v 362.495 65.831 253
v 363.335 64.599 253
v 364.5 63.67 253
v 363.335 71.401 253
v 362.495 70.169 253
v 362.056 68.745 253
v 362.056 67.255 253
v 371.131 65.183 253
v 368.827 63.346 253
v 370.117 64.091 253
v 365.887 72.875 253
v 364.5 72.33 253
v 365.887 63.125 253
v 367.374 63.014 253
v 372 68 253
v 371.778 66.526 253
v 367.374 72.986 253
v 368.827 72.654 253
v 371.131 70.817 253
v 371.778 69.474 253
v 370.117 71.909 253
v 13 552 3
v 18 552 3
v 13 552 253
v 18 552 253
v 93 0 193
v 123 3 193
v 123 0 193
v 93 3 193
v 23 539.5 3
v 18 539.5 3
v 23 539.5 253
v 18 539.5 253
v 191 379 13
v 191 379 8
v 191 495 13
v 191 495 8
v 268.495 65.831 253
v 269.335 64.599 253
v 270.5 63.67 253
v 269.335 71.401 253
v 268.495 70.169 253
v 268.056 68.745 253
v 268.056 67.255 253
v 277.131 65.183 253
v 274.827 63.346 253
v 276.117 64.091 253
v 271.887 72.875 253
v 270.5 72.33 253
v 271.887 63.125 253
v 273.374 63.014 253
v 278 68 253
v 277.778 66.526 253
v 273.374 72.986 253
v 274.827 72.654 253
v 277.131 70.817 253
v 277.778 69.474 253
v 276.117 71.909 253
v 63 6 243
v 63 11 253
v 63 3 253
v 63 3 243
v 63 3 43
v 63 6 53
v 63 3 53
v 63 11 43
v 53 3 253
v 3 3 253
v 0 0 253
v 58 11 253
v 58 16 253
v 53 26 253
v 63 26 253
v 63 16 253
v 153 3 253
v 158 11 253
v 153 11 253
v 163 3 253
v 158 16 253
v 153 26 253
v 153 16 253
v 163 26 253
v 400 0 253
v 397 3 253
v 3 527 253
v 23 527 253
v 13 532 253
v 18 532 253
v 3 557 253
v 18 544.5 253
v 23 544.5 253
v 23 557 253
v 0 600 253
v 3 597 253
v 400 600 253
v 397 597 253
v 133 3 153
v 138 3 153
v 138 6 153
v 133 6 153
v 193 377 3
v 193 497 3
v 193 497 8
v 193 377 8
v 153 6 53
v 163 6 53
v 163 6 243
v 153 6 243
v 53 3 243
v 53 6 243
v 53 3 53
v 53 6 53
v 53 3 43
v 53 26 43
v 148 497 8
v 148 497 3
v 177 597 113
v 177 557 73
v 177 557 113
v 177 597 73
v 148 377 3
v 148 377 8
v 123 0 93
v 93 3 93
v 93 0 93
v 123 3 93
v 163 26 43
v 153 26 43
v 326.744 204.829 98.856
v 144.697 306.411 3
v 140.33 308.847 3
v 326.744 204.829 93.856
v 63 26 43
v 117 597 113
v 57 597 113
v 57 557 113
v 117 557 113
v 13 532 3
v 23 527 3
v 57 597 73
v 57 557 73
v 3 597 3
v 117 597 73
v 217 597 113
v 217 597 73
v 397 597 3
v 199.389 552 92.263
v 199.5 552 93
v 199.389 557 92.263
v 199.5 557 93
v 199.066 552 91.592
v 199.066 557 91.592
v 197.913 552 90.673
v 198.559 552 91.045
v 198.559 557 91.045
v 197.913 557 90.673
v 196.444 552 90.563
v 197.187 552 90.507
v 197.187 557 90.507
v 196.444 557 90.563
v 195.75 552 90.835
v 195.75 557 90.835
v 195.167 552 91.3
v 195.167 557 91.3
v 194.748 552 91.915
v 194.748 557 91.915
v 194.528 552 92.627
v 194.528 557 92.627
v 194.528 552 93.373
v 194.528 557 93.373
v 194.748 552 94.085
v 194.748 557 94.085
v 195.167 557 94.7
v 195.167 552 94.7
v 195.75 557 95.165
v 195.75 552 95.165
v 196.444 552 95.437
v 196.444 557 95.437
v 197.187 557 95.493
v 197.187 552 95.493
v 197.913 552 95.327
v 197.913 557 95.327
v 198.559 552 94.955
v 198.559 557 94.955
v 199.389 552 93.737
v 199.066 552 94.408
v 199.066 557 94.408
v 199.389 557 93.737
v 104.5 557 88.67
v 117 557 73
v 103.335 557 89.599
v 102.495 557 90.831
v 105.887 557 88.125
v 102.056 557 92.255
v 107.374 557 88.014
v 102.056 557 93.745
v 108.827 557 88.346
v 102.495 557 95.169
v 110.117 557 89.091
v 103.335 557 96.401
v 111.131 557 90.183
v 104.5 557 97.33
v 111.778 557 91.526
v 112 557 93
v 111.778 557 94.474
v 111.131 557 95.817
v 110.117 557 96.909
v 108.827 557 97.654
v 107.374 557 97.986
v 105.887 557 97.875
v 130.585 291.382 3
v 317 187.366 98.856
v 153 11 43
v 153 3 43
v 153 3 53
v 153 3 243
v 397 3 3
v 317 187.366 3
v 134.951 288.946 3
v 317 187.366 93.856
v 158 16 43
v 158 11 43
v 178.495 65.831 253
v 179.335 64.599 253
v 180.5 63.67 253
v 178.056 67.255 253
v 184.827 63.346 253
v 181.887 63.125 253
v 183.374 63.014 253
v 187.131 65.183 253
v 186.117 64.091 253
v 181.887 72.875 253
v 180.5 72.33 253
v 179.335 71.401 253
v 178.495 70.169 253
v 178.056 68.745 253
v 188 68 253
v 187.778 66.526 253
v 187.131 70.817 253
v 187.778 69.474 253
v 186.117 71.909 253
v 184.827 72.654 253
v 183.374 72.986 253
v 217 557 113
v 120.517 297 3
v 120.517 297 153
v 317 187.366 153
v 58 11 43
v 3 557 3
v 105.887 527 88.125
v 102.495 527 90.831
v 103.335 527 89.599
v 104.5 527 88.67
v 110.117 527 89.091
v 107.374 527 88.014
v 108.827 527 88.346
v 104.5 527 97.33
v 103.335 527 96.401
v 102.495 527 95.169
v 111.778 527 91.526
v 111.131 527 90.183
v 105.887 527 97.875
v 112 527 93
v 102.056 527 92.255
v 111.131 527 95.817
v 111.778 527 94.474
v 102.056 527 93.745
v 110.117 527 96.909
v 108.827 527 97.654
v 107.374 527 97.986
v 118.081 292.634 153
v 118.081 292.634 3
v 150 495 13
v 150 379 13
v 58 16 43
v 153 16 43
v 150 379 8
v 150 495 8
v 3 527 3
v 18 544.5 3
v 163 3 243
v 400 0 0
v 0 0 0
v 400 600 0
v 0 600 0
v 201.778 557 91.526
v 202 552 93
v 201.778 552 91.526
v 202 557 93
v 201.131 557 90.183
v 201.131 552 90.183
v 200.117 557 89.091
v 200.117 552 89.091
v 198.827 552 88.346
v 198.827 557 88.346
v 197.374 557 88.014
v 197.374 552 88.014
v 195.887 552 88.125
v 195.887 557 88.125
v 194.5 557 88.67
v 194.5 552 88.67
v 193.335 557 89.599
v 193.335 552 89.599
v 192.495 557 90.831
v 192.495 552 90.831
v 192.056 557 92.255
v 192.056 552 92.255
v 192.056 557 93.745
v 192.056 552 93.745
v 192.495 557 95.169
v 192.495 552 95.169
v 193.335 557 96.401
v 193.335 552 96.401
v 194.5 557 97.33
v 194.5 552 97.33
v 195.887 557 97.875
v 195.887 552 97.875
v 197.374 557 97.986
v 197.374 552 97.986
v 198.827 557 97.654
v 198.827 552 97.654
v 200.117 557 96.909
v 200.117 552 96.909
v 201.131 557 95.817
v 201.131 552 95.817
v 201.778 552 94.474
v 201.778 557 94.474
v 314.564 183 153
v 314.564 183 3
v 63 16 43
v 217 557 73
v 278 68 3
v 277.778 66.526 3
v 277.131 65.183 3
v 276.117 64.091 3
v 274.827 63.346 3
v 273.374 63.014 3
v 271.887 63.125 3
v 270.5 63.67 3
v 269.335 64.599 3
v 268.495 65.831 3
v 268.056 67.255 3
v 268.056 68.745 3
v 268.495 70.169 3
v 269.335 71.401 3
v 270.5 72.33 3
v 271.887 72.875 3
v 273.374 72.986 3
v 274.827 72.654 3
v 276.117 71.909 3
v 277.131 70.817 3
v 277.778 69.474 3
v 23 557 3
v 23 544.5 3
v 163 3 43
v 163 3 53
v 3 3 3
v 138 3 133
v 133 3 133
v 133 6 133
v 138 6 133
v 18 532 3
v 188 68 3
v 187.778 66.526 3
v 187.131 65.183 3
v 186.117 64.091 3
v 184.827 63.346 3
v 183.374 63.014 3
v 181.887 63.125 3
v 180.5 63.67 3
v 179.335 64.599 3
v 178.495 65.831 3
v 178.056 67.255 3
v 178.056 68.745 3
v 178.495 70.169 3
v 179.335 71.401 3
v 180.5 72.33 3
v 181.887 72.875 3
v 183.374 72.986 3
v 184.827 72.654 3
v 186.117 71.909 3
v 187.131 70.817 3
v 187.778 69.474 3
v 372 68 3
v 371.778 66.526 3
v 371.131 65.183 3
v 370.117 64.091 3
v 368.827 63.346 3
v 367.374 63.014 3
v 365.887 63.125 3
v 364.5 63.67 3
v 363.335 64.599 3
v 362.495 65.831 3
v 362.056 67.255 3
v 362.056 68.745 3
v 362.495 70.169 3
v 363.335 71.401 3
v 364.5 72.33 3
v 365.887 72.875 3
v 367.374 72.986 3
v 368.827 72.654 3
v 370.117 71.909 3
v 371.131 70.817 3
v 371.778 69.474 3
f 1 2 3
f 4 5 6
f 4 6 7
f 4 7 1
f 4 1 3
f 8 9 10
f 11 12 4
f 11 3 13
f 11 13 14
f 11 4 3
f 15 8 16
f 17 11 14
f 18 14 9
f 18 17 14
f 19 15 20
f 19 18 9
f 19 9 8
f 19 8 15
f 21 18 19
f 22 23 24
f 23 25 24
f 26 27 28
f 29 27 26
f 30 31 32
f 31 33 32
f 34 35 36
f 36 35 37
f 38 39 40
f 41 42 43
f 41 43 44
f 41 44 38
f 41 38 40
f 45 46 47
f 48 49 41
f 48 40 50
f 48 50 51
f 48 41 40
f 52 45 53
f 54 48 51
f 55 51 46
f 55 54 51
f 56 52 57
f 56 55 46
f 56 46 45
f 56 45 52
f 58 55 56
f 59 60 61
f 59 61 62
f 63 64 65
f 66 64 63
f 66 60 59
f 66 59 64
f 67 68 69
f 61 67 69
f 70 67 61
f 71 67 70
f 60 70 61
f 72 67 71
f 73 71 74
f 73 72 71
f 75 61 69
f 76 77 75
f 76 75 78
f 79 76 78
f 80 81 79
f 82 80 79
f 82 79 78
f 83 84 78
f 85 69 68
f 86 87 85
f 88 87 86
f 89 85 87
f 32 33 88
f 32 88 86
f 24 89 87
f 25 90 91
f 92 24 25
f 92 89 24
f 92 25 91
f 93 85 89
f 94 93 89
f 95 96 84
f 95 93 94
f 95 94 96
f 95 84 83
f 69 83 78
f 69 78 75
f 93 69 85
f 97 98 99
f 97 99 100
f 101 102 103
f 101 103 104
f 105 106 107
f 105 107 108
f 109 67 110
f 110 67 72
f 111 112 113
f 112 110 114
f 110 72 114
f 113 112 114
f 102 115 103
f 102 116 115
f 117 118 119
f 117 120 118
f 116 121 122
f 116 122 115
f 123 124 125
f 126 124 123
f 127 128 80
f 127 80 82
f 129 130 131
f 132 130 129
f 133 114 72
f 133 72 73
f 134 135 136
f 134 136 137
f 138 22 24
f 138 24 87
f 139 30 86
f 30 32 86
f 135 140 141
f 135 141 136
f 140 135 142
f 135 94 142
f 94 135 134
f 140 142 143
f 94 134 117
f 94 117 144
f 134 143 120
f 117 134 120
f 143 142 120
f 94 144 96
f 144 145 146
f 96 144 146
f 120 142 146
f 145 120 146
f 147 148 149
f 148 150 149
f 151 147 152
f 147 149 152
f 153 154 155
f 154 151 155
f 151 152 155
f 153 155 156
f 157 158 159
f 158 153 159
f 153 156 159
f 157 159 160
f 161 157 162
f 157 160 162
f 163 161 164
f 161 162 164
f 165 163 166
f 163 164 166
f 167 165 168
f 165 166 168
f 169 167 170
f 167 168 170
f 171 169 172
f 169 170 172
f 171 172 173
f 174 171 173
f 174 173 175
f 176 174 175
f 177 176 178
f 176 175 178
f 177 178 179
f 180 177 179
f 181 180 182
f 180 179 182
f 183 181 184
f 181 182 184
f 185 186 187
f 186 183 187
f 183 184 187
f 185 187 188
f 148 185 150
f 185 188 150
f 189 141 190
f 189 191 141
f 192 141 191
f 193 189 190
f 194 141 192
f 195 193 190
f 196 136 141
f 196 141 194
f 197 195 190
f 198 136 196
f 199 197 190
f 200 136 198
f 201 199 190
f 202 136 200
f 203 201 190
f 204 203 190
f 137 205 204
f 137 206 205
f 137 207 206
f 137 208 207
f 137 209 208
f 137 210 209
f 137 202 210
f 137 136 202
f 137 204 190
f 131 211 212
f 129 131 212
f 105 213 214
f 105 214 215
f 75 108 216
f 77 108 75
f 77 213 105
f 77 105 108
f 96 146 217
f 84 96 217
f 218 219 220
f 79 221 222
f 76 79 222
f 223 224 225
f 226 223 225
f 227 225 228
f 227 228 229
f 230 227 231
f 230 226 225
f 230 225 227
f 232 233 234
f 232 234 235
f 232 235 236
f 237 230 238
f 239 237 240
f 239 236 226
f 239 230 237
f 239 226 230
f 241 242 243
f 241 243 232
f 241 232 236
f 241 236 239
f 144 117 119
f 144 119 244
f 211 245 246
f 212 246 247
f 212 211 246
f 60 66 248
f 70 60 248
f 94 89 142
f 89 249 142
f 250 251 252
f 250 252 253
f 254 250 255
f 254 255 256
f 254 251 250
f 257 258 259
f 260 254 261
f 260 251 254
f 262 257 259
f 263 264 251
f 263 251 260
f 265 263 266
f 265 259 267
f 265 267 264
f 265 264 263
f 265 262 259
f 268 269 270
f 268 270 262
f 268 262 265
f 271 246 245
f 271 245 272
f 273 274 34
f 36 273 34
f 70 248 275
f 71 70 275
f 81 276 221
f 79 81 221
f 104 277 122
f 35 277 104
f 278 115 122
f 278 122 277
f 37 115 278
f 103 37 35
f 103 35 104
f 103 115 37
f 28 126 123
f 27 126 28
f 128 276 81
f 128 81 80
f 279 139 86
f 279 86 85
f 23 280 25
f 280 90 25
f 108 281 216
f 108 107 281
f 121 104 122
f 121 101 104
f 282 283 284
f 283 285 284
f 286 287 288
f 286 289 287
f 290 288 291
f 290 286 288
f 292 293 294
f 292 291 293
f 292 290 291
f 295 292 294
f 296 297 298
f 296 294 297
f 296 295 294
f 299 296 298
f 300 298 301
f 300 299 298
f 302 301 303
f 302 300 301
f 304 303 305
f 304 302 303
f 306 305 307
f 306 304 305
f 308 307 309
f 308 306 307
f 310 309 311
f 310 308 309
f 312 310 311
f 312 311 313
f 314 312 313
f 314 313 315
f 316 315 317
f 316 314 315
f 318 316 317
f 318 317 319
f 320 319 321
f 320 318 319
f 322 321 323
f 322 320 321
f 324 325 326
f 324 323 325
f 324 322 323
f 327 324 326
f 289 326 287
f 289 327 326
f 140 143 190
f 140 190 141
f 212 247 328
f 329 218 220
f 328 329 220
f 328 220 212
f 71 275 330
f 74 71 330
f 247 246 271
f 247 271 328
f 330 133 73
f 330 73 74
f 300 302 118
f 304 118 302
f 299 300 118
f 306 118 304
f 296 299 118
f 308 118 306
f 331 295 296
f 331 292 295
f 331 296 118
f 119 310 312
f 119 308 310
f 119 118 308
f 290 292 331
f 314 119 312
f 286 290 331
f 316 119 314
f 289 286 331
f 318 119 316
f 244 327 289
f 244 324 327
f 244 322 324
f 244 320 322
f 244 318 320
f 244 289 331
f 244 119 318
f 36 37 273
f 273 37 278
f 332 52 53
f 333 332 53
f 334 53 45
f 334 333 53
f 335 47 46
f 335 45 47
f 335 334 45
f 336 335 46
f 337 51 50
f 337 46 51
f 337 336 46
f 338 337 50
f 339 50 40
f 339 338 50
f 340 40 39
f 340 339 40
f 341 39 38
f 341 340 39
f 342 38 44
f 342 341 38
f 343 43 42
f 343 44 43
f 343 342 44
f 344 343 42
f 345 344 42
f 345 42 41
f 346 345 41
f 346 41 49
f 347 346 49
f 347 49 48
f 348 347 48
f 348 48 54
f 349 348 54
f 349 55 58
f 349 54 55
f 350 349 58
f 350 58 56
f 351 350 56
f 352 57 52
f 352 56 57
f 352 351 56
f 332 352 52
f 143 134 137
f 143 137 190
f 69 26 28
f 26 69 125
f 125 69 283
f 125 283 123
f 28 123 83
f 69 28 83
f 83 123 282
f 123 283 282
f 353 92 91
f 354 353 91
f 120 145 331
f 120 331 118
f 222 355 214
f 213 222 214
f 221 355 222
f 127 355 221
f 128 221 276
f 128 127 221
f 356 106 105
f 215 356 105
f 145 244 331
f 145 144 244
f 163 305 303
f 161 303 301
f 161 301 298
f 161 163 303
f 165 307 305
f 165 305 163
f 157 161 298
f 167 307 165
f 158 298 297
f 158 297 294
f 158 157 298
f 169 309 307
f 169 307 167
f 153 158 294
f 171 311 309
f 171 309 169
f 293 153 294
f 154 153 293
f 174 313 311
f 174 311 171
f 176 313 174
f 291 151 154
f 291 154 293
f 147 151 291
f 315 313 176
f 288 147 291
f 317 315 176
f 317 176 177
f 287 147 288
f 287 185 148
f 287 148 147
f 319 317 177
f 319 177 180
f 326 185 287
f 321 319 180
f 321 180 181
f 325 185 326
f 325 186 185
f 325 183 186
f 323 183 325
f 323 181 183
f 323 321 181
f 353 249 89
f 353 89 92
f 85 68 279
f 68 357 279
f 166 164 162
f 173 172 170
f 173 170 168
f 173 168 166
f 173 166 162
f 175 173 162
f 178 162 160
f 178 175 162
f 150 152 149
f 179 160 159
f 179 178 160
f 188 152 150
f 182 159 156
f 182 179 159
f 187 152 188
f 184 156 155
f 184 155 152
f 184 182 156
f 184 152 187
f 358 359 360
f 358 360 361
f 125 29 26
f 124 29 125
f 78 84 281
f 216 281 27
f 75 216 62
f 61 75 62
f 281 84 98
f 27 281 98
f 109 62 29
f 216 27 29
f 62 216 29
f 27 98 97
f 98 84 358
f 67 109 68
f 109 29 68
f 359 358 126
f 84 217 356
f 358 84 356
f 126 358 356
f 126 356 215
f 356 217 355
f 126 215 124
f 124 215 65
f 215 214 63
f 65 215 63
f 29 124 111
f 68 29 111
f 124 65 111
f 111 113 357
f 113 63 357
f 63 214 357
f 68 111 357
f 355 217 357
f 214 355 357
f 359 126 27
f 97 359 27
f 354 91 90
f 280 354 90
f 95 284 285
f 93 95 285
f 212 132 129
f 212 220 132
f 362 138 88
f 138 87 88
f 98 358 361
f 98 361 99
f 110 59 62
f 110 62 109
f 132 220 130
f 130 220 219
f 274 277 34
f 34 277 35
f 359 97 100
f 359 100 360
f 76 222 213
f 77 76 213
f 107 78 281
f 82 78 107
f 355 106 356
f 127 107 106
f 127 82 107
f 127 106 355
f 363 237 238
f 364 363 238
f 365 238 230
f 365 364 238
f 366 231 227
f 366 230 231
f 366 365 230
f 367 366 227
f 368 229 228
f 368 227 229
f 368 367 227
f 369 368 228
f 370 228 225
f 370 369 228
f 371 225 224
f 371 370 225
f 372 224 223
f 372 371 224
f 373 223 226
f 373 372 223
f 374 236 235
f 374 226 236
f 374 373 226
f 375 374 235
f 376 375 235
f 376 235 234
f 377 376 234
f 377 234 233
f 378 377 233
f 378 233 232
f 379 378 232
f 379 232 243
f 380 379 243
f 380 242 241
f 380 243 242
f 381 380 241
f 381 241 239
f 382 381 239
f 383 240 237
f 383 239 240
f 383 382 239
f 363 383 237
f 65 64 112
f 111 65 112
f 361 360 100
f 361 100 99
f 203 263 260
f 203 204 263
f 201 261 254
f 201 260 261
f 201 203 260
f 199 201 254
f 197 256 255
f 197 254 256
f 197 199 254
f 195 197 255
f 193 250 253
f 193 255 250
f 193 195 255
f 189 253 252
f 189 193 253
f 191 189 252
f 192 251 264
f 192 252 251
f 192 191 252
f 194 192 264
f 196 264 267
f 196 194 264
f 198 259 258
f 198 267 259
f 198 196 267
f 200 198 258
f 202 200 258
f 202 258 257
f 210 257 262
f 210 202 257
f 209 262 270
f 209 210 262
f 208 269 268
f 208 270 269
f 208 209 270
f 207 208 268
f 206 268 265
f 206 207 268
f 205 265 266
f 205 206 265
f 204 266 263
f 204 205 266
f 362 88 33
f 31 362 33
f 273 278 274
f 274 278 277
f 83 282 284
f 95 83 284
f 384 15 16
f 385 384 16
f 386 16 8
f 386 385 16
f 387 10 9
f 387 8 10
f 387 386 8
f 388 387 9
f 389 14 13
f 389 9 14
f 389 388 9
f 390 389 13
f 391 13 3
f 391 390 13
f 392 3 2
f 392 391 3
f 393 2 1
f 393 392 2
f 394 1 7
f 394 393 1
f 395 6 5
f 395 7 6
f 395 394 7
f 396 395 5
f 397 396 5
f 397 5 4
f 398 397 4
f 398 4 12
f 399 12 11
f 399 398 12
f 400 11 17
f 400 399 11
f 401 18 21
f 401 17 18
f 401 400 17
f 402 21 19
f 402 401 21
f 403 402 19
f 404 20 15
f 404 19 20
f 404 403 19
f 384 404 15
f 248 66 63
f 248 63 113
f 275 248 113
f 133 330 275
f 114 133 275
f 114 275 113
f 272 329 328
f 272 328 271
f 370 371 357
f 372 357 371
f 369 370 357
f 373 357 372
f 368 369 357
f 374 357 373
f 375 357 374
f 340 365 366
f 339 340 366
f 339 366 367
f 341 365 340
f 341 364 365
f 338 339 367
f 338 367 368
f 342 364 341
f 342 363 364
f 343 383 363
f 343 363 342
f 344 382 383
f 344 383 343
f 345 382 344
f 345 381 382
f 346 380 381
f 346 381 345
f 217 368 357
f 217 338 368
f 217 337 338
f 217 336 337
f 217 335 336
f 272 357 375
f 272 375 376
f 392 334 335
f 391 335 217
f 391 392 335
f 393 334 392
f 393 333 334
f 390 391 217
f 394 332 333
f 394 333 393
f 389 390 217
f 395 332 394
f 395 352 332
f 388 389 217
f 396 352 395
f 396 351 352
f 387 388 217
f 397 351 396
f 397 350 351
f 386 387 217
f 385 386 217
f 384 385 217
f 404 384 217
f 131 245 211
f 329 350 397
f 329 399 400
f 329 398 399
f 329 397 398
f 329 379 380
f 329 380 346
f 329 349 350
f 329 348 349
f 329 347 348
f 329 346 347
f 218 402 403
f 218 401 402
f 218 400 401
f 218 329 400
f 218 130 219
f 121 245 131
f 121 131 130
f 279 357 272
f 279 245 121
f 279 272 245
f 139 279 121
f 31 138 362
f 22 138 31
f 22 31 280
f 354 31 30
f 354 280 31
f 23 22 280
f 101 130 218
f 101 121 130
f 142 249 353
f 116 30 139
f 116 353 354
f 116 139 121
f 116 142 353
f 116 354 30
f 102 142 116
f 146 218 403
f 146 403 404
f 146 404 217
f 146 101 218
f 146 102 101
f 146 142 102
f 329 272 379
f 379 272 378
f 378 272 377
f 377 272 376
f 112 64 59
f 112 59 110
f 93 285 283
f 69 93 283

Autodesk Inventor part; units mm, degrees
ref_plane "YZ Plane" through (0, 0, 0) normal (1, 0, 0) x (0, 1, 0)
ref_plane "XZ Plane" through (0, 0, 0) normal (0, 1, 0) x (-1, 0, 0)
ref_plane "XY Plane" through (0, 0, 0) normal (0, 0, 1) x (1, 0, 0)
sketch "Sketch1" plane through (0, 0, 0) normal (0, 0, 1) x (1, 0, 0)
  line L0 (0, 0) -> (400, 0)
  line L1 (400, 0) -> (400, 600)
  line L2 (400, 600) -> (0, 600)
  line L3 (0, 600) -> (0, 0)
  dimension "d0" = 400
  dimension "d1" = 600
extrude "Extrusion1" add sketch "Sketch1" along normal blind 3
sketch "Sketch2" plane through (0, 0, 3) normal (0, 0, 1) x (1, 0, 0)
  line L0 (400, 600) -> (0, 600) projected
  line L1 (400, 0) -> (400, 600) projected
  line L2 (0, 600) -> (400, 600)
  line L3 (400, 600) -> (400, 0)
  line L4 (400, 0) -> (0, 0)
  line L5 (0, 0) -> (0, 600)
  line L6 (3, 597) -> (397, 597)
  line L7 (397, 597) -> (397, 3)
  line L8 (397, 3) -> (3, 3)
  line L9 (3, 3) -> (3, 597)
  dimension "d4" = 3
extrude "Extrusion2" add sketch "Sketch2" along normal blind 250
sketch "Sketch3" plane through (3, 597, 3) normal (0, -1, 0) x (1, 0, 0)
  line L0 (54, 110) -> (114, 110)
  line L1 (114, 110) -> (114, 70)
  line L2 (114, 70) -> (54, 70)
  line L3 (54, 70) -> (54, 110)
  line L4 (0, 250) -> (394, 250) projected
  line L5 (394, 0) -> (0, 0) projected
  point P0 (-3, -3)
  dimension "d7" = 40
  dimension "d8" = 60
  dimension "d9" = 54
  dimension "d11" = 70
extrude "Extrusion3" add sketch "Sketch3" along normal blind 40
sketch "Sketch4" plane through (3, 557, 3) normal (0, -1, 0) x (1, 0, 0)
  circle A0 centre (104, 90) radius 5
  line L0 (114, 70) -> (114, 110) projected
  line L1 (114, 110) -> (54, 110) projected
  point P0 (-3, -3)
  dimension "d14" = 10
  dimension "d15" = 10
  dimension "d16" = 20
extrude "Extrusion4" add sketch "Sketch4" along normal blind 30
sketch "Sketch5" plane through (0, 0, 253) normal (0, 0, 1) x (1, 0, 0)
  line L0 (3, 3) -> (3, 597) projected
  line L1 (3, 557) -> (23, 557)
  line L2 (23, 557) -> (23, 527)
  line L3 (23, 527) -> (3, 527)
  line L4 (3, 527) -> (3, 557)
  line L5 (23, 544.5) -> (18, 544.5)
  line L6 (18, 544.5) -> (18, 539.5)
  line L7 (18, 539.5) -> (23, 539.5)
  line L8 (23, 539.5) -> (23, 544.5)
  line L9 (23, 542) -> (-4.5465, 542) construction
  line L10 (18, 552) -> (13, 552)
  line L11 (13, 552) -> (13, 532)
  line L12 (13, 532) -> (18, 532)
  line L13 (18, 532) -> (18, 552)
  line L14 (3, 597) -> (397, 597) construction
  point P0 (0, 0)
  point P1 (18, 542)
  point P2 (18, 544.5)
  point P3 (3, 527)
  point P4 (23, 539.5)
  point P5 (18, 539.5)
  dimension "d19" = 20
  dimension "d20" = 30
  dimension "d21" = 5
  dimension "d22" = 5
  dimension "d24" = 2.5
  dimension "d25" = 5
  dimension "d26" = 20
  dimension "d28" = 10
  dimension "d29" = 40
extrude "Extrusion5" add sketch "Sketch5" against normal blind 250 contours L0 L1 L2 L5 L13 L10 L11 L12 L7 L3
sketch "Sketch6" plane through (0, 0, 3) normal (0, 0, 1) x (1, 0, 0)
  line L0 (148, 497) -> (193, 497)
  line L1 (193, 497) -> (193, 377)
  line L2 (193, 377) -> (148, 377)
  line L3 (148, 377) -> (148, 497)
  line L4 (3, 3) -> (3, 527) projected
  line L5 (3, 597) -> (397, 597) projected
  point P0 (0, 0)
  dimension "d32" = 45
  dimension "d33" = 120
  dimension "d34" = 145
  dimension "d35" = 100
extrude "Extrusion6" add sketch "Sketch6" along normal blind 5
sketch "Sketch7" plane through (0, 0, 8) normal (0, 0, 1) x (1, 0, 0)
  line L0 (148, 377) -> (193, 377) projected
  line L1 (148, 497) -> (193, 497)
  line L2 (193, 497) -> (193, 377)
  line L3 (193, 377) -> (148, 377)
  line L4 (148, 377) -> (148, 497)
  line L5 (191, 495) -> (150, 495)
  line L6 (150, 495) -> (150, 379)
  line L7 (150, 379) -> (191, 379)
  line L8 (191, 379) -> (191, 495)
  point P0 (0, 0)
  point P1 (148, 377)
  dimension "d40" = 2
extrude "Extrusion7" add sketch "Sketch7" along normal blind 5 contours L8 L7 L6 L5
sketch "Sketch8" plane through (0, 0, 253) normal (0, 0, 1) x (1, 0, 0)
  line L0 (3, 527) -> (3, 3) projected
  line L1 (53, 26) -> (63, 26)
  line L2 (63, 26) -> (63, 6)
  line L3 (63, 6) -> (53, 6)
  line L4 (53, 6) -> (53, 26)
  line L5 (397, 3) -> (3, 3) projected
  line L6 (153, 26) -> (163, 26)
  line L7 (163, 26) -> (163, 6)
  line L8 (163, 6) -> (153, 6)
  line L9 (153, 6) -> (153, 26)
  line L10 (58, 16) -> (63, 16)
  line L11 (63, 16) -> (63, 11)
  line L12 (63, 11) -> (58, 11)
  line L13 (58, 11) -> (58, 16)
  line L14 (153, 16) -> (158, 16)
  line L15 (158, 16) -> (158, 11)
  line L16 (158, 11) -> (153, 11)
  line L17 (153, 11) -> (153, 16)
  point P0 (0, 0)
  point P1 (53, 28)
  dimension "d54" = 10
  dimension "d55" = 20
  dimension "d57" = 50
  dimension "d60" = 3
  dimension "d61" = 10
  dimension "d62" = 20
  dimension "d65" = 3
  dimension "d74" = 5
  dimension "d75" = 5
  dimension "d76" = 90
  dimension "d77" = 5
  dimension "d79" = 5
  dimension "d80" = 5
  dimension "d81" = 5
extrude "Extrusion8" add sketch "Sketch8" against normal blind 210 contours L1 L2 L10 L13 L12 L3 L4 | L6 L7 L8 L9 L16 L15 L14
sketch "Sketch9" plane through (53, 6, 253) normal (0, -1, 0) x (1, 0, 0)
  line L0 (0, 0) -> (0, -210) projected
  line L1 (10, 0) -> (10, -210) projected
  line L2 (0, 0) -> (10, 0)
  line L3 (10, 0) -> (10, -10)
  line L4 (10, -10) -> (0, -10)
  line L5 (0, -10) -> (0, 0)
  line L6 (100, 0) -> (110, 0) projected
  line L7 (110, 0) -> (110, -210) projected
  line L8 (100, 0) -> (110, 0)
  line L9 (110, 0) -> (110, -10)
  line L10 (110, -10) -> (100, -10)
  line L11 (100, -10) -> (100, 0)
  line L12 (10, -210) -> (0, -210) projected
  line L13 (0, -210) -> (10, -210)
  line L14 (10, -210) -> (10, -200)
  line L15 (10, -200) -> (0, -200)
  line L16 (0, -200) -> (0, -210)
  line L17 (110, -210) -> (100, -210) projected
  line L18 (100, -210) -> (110, -210)
  line L19 (110, -210) -> (110, -200)
  line L20 (110, -200) -> (100, -200)
  line L21 (100, -200) -> (100, -210)
  point P0 (-53, -253)
  point P1 (10, -200)
  point P2 (0, -200)
  dimension "d67" = 10
  dimension "d68" = 10
  dimension "d69" = 10
  dimension "d70" = 10
  dimension "d73" = 10
extrude "Extrusion9" add sketch "Sketch9" along normal blind 3 contours L2 L1 L4 L0 | L15 L1 L12 L0 | L7 L17 L21 L20 | L6 L7 L10 L11
sketch "Sketch10" plane through (3, 3, 3) normal (0, 1, 0) x (1, 0, 0)
  line L0 (90, -90) -> (120, -90)
  line L1 (120, -90) -> (120, -190)
  line L2 (120, -190) -> (90, -190)
  line L3 (90, -190) -> (90, -90)
  line L4 (50, -50) -> (60, -50) projected
  line L5 (60, -240) -> (50, -240) projected
  line L6 (60, -250) -> (60, -40) projected
  point P0 (-3, 3)
  dimension "d84" = 30
  dimension "d85" = 100
  dimension "d87" = 50
  dimension "d88" = 30
extrude "Extrusion10" cut sketch "Sketch10" against normal blind 5
sketch "Sketch11" plane through (3, 3, 3) normal (0, 1, 0) x (1, 0, 0)
  line L0 (130, -130) -> (135, -130)
  line L1 (135, -130) -> (135, -150)
  line L2 (135, -150) -> (130, -150)
  line L3 (130, -150) -> (130, -130)
  line L4 (120, -90) -> (120, -190) projected
  line L5 (120, -190) -> (90, -190) projected
  point P0 (-3, 3)
  dimension "d91" = 5
  dimension "d92" = 20
  dimension "d93" = 10
  dimension "d94" = 40
extrude "Extrusion11" add sketch "Sketch11" along normal blind 3
sketch "Sketch12" plane through (0, 0, 3) normal (0, 0, 1) x (1, 0, 0)
  line L0 (120.5173, 297) -> (317, 187.3663)
  line L1 (317, 187.3663) -> (314.5637, 183)
  line L2 (314.5637, 183) -> (118.081, 292.6337)
  line L3 (120.5173, 297) -> (118.081, 292.6337)
  line L4 (397, 597) -> (397, 3) projected
  line L5 (397, 3) -> (3, 3) projected
  line L6 (3, 597) -> (397, 597) projected
  point P0 (0, 0)
  point P1 (163, 3)
  dimension "d97" = 5
  dimension "d99" = 80
  dimension "d100" = 180
  dimension "d101" = 225
  dimension "d104" = 300
extrude "Extrusion12" add sketch "Sketch12" along normal blind 150
sketch "Sketch13" plane through (3, 597, 3) normal (0, -1, 0) x (1, 0, 0)
  line L0 (174, 110) -> (214, 110)
  line L1 (214, 110) -> (214, 70)
  line L2 (214, 70) -> (174, 70)
  line L3 (174, 70) -> (174, 110)
  circle A0 centre (104, 90) radius 5 projected
  point P0 (-3, -3)
  dimension "d105" = 40
  dimension "d106" = 70
extrude "Extrusion13" add sketch "Sketch13" along normal blind 40 contours L0 L1 L2 L3
sketch "Sketch15" plane through (3, 557, 3) normal (0, -1, 0) x (1, 0, 0)
  circle A0 centre (194, 90) radius 5
  circle A1 centre (194, 90) radius 2.5
  line L0 (174, 110) -> (174, 70) projected
  line L1 (214, 110) -> (174, 110) projected
  point P0 (-3, -3)
  dimension "d114" = 10
  dimension "d115" = 5
  dimension "d116" = 20
  dimension "d117" = 20
extrude "Extrusion15" add sketch "Sketch15" along normal blind 5
sketch "Sketch16" plane through (0, 0, 3) normal (0, 0, 1) x (1, 0, 0)
  circle A0 centre (183, 68) radius 5
  circle A1 centre (367, 68) radius 5
  line L0 (397, 597) -> (397, 3) projected
  line L1 (163, 3) -> (163, 26) projected
  line L2 (397, 3) -> (163, 3) projected
  circle A2 centre (273, 68) radius 5
  point P0 (0, 0)
  dimension "d120" = 10
  dimension "d121" = 10
  dimension "d122" = 30
  dimension "d123" = 20
  dimension "d124" = 65
  dimension "d125" = 65
  dimension "d128" = 10
  dimension "d129" = 90
extrude "Extrusion16" add sketch "Sketch16" along normal blind 250
sketch "Sketch17" plane through (120.5173, 297, 153) normal (0.4873, 0.8733, 0) x (0.8733, -0.4873, 0)
  line L0 (225, 150) -> (225, 0) projected
  line L1 (225, 59.1442) -> (16.5288, 150)
  line L2 (-214.6928, 150) -> (40.632, 150) projected
  line L3 (11.5288, 150) -> (225, 54.1442)
  line L4 (225, 54.1442) -> (225, 59.1442)
  line L5 (11.5288, 150) -> (16.5288, 150)
  point P0 (39.474, 153)
  dimension "d132" = 5
  dimension "d133" = 5
extrude "Extrusion17" add sketch "Sketch17" along normal blind 20
properties part number "caja"
